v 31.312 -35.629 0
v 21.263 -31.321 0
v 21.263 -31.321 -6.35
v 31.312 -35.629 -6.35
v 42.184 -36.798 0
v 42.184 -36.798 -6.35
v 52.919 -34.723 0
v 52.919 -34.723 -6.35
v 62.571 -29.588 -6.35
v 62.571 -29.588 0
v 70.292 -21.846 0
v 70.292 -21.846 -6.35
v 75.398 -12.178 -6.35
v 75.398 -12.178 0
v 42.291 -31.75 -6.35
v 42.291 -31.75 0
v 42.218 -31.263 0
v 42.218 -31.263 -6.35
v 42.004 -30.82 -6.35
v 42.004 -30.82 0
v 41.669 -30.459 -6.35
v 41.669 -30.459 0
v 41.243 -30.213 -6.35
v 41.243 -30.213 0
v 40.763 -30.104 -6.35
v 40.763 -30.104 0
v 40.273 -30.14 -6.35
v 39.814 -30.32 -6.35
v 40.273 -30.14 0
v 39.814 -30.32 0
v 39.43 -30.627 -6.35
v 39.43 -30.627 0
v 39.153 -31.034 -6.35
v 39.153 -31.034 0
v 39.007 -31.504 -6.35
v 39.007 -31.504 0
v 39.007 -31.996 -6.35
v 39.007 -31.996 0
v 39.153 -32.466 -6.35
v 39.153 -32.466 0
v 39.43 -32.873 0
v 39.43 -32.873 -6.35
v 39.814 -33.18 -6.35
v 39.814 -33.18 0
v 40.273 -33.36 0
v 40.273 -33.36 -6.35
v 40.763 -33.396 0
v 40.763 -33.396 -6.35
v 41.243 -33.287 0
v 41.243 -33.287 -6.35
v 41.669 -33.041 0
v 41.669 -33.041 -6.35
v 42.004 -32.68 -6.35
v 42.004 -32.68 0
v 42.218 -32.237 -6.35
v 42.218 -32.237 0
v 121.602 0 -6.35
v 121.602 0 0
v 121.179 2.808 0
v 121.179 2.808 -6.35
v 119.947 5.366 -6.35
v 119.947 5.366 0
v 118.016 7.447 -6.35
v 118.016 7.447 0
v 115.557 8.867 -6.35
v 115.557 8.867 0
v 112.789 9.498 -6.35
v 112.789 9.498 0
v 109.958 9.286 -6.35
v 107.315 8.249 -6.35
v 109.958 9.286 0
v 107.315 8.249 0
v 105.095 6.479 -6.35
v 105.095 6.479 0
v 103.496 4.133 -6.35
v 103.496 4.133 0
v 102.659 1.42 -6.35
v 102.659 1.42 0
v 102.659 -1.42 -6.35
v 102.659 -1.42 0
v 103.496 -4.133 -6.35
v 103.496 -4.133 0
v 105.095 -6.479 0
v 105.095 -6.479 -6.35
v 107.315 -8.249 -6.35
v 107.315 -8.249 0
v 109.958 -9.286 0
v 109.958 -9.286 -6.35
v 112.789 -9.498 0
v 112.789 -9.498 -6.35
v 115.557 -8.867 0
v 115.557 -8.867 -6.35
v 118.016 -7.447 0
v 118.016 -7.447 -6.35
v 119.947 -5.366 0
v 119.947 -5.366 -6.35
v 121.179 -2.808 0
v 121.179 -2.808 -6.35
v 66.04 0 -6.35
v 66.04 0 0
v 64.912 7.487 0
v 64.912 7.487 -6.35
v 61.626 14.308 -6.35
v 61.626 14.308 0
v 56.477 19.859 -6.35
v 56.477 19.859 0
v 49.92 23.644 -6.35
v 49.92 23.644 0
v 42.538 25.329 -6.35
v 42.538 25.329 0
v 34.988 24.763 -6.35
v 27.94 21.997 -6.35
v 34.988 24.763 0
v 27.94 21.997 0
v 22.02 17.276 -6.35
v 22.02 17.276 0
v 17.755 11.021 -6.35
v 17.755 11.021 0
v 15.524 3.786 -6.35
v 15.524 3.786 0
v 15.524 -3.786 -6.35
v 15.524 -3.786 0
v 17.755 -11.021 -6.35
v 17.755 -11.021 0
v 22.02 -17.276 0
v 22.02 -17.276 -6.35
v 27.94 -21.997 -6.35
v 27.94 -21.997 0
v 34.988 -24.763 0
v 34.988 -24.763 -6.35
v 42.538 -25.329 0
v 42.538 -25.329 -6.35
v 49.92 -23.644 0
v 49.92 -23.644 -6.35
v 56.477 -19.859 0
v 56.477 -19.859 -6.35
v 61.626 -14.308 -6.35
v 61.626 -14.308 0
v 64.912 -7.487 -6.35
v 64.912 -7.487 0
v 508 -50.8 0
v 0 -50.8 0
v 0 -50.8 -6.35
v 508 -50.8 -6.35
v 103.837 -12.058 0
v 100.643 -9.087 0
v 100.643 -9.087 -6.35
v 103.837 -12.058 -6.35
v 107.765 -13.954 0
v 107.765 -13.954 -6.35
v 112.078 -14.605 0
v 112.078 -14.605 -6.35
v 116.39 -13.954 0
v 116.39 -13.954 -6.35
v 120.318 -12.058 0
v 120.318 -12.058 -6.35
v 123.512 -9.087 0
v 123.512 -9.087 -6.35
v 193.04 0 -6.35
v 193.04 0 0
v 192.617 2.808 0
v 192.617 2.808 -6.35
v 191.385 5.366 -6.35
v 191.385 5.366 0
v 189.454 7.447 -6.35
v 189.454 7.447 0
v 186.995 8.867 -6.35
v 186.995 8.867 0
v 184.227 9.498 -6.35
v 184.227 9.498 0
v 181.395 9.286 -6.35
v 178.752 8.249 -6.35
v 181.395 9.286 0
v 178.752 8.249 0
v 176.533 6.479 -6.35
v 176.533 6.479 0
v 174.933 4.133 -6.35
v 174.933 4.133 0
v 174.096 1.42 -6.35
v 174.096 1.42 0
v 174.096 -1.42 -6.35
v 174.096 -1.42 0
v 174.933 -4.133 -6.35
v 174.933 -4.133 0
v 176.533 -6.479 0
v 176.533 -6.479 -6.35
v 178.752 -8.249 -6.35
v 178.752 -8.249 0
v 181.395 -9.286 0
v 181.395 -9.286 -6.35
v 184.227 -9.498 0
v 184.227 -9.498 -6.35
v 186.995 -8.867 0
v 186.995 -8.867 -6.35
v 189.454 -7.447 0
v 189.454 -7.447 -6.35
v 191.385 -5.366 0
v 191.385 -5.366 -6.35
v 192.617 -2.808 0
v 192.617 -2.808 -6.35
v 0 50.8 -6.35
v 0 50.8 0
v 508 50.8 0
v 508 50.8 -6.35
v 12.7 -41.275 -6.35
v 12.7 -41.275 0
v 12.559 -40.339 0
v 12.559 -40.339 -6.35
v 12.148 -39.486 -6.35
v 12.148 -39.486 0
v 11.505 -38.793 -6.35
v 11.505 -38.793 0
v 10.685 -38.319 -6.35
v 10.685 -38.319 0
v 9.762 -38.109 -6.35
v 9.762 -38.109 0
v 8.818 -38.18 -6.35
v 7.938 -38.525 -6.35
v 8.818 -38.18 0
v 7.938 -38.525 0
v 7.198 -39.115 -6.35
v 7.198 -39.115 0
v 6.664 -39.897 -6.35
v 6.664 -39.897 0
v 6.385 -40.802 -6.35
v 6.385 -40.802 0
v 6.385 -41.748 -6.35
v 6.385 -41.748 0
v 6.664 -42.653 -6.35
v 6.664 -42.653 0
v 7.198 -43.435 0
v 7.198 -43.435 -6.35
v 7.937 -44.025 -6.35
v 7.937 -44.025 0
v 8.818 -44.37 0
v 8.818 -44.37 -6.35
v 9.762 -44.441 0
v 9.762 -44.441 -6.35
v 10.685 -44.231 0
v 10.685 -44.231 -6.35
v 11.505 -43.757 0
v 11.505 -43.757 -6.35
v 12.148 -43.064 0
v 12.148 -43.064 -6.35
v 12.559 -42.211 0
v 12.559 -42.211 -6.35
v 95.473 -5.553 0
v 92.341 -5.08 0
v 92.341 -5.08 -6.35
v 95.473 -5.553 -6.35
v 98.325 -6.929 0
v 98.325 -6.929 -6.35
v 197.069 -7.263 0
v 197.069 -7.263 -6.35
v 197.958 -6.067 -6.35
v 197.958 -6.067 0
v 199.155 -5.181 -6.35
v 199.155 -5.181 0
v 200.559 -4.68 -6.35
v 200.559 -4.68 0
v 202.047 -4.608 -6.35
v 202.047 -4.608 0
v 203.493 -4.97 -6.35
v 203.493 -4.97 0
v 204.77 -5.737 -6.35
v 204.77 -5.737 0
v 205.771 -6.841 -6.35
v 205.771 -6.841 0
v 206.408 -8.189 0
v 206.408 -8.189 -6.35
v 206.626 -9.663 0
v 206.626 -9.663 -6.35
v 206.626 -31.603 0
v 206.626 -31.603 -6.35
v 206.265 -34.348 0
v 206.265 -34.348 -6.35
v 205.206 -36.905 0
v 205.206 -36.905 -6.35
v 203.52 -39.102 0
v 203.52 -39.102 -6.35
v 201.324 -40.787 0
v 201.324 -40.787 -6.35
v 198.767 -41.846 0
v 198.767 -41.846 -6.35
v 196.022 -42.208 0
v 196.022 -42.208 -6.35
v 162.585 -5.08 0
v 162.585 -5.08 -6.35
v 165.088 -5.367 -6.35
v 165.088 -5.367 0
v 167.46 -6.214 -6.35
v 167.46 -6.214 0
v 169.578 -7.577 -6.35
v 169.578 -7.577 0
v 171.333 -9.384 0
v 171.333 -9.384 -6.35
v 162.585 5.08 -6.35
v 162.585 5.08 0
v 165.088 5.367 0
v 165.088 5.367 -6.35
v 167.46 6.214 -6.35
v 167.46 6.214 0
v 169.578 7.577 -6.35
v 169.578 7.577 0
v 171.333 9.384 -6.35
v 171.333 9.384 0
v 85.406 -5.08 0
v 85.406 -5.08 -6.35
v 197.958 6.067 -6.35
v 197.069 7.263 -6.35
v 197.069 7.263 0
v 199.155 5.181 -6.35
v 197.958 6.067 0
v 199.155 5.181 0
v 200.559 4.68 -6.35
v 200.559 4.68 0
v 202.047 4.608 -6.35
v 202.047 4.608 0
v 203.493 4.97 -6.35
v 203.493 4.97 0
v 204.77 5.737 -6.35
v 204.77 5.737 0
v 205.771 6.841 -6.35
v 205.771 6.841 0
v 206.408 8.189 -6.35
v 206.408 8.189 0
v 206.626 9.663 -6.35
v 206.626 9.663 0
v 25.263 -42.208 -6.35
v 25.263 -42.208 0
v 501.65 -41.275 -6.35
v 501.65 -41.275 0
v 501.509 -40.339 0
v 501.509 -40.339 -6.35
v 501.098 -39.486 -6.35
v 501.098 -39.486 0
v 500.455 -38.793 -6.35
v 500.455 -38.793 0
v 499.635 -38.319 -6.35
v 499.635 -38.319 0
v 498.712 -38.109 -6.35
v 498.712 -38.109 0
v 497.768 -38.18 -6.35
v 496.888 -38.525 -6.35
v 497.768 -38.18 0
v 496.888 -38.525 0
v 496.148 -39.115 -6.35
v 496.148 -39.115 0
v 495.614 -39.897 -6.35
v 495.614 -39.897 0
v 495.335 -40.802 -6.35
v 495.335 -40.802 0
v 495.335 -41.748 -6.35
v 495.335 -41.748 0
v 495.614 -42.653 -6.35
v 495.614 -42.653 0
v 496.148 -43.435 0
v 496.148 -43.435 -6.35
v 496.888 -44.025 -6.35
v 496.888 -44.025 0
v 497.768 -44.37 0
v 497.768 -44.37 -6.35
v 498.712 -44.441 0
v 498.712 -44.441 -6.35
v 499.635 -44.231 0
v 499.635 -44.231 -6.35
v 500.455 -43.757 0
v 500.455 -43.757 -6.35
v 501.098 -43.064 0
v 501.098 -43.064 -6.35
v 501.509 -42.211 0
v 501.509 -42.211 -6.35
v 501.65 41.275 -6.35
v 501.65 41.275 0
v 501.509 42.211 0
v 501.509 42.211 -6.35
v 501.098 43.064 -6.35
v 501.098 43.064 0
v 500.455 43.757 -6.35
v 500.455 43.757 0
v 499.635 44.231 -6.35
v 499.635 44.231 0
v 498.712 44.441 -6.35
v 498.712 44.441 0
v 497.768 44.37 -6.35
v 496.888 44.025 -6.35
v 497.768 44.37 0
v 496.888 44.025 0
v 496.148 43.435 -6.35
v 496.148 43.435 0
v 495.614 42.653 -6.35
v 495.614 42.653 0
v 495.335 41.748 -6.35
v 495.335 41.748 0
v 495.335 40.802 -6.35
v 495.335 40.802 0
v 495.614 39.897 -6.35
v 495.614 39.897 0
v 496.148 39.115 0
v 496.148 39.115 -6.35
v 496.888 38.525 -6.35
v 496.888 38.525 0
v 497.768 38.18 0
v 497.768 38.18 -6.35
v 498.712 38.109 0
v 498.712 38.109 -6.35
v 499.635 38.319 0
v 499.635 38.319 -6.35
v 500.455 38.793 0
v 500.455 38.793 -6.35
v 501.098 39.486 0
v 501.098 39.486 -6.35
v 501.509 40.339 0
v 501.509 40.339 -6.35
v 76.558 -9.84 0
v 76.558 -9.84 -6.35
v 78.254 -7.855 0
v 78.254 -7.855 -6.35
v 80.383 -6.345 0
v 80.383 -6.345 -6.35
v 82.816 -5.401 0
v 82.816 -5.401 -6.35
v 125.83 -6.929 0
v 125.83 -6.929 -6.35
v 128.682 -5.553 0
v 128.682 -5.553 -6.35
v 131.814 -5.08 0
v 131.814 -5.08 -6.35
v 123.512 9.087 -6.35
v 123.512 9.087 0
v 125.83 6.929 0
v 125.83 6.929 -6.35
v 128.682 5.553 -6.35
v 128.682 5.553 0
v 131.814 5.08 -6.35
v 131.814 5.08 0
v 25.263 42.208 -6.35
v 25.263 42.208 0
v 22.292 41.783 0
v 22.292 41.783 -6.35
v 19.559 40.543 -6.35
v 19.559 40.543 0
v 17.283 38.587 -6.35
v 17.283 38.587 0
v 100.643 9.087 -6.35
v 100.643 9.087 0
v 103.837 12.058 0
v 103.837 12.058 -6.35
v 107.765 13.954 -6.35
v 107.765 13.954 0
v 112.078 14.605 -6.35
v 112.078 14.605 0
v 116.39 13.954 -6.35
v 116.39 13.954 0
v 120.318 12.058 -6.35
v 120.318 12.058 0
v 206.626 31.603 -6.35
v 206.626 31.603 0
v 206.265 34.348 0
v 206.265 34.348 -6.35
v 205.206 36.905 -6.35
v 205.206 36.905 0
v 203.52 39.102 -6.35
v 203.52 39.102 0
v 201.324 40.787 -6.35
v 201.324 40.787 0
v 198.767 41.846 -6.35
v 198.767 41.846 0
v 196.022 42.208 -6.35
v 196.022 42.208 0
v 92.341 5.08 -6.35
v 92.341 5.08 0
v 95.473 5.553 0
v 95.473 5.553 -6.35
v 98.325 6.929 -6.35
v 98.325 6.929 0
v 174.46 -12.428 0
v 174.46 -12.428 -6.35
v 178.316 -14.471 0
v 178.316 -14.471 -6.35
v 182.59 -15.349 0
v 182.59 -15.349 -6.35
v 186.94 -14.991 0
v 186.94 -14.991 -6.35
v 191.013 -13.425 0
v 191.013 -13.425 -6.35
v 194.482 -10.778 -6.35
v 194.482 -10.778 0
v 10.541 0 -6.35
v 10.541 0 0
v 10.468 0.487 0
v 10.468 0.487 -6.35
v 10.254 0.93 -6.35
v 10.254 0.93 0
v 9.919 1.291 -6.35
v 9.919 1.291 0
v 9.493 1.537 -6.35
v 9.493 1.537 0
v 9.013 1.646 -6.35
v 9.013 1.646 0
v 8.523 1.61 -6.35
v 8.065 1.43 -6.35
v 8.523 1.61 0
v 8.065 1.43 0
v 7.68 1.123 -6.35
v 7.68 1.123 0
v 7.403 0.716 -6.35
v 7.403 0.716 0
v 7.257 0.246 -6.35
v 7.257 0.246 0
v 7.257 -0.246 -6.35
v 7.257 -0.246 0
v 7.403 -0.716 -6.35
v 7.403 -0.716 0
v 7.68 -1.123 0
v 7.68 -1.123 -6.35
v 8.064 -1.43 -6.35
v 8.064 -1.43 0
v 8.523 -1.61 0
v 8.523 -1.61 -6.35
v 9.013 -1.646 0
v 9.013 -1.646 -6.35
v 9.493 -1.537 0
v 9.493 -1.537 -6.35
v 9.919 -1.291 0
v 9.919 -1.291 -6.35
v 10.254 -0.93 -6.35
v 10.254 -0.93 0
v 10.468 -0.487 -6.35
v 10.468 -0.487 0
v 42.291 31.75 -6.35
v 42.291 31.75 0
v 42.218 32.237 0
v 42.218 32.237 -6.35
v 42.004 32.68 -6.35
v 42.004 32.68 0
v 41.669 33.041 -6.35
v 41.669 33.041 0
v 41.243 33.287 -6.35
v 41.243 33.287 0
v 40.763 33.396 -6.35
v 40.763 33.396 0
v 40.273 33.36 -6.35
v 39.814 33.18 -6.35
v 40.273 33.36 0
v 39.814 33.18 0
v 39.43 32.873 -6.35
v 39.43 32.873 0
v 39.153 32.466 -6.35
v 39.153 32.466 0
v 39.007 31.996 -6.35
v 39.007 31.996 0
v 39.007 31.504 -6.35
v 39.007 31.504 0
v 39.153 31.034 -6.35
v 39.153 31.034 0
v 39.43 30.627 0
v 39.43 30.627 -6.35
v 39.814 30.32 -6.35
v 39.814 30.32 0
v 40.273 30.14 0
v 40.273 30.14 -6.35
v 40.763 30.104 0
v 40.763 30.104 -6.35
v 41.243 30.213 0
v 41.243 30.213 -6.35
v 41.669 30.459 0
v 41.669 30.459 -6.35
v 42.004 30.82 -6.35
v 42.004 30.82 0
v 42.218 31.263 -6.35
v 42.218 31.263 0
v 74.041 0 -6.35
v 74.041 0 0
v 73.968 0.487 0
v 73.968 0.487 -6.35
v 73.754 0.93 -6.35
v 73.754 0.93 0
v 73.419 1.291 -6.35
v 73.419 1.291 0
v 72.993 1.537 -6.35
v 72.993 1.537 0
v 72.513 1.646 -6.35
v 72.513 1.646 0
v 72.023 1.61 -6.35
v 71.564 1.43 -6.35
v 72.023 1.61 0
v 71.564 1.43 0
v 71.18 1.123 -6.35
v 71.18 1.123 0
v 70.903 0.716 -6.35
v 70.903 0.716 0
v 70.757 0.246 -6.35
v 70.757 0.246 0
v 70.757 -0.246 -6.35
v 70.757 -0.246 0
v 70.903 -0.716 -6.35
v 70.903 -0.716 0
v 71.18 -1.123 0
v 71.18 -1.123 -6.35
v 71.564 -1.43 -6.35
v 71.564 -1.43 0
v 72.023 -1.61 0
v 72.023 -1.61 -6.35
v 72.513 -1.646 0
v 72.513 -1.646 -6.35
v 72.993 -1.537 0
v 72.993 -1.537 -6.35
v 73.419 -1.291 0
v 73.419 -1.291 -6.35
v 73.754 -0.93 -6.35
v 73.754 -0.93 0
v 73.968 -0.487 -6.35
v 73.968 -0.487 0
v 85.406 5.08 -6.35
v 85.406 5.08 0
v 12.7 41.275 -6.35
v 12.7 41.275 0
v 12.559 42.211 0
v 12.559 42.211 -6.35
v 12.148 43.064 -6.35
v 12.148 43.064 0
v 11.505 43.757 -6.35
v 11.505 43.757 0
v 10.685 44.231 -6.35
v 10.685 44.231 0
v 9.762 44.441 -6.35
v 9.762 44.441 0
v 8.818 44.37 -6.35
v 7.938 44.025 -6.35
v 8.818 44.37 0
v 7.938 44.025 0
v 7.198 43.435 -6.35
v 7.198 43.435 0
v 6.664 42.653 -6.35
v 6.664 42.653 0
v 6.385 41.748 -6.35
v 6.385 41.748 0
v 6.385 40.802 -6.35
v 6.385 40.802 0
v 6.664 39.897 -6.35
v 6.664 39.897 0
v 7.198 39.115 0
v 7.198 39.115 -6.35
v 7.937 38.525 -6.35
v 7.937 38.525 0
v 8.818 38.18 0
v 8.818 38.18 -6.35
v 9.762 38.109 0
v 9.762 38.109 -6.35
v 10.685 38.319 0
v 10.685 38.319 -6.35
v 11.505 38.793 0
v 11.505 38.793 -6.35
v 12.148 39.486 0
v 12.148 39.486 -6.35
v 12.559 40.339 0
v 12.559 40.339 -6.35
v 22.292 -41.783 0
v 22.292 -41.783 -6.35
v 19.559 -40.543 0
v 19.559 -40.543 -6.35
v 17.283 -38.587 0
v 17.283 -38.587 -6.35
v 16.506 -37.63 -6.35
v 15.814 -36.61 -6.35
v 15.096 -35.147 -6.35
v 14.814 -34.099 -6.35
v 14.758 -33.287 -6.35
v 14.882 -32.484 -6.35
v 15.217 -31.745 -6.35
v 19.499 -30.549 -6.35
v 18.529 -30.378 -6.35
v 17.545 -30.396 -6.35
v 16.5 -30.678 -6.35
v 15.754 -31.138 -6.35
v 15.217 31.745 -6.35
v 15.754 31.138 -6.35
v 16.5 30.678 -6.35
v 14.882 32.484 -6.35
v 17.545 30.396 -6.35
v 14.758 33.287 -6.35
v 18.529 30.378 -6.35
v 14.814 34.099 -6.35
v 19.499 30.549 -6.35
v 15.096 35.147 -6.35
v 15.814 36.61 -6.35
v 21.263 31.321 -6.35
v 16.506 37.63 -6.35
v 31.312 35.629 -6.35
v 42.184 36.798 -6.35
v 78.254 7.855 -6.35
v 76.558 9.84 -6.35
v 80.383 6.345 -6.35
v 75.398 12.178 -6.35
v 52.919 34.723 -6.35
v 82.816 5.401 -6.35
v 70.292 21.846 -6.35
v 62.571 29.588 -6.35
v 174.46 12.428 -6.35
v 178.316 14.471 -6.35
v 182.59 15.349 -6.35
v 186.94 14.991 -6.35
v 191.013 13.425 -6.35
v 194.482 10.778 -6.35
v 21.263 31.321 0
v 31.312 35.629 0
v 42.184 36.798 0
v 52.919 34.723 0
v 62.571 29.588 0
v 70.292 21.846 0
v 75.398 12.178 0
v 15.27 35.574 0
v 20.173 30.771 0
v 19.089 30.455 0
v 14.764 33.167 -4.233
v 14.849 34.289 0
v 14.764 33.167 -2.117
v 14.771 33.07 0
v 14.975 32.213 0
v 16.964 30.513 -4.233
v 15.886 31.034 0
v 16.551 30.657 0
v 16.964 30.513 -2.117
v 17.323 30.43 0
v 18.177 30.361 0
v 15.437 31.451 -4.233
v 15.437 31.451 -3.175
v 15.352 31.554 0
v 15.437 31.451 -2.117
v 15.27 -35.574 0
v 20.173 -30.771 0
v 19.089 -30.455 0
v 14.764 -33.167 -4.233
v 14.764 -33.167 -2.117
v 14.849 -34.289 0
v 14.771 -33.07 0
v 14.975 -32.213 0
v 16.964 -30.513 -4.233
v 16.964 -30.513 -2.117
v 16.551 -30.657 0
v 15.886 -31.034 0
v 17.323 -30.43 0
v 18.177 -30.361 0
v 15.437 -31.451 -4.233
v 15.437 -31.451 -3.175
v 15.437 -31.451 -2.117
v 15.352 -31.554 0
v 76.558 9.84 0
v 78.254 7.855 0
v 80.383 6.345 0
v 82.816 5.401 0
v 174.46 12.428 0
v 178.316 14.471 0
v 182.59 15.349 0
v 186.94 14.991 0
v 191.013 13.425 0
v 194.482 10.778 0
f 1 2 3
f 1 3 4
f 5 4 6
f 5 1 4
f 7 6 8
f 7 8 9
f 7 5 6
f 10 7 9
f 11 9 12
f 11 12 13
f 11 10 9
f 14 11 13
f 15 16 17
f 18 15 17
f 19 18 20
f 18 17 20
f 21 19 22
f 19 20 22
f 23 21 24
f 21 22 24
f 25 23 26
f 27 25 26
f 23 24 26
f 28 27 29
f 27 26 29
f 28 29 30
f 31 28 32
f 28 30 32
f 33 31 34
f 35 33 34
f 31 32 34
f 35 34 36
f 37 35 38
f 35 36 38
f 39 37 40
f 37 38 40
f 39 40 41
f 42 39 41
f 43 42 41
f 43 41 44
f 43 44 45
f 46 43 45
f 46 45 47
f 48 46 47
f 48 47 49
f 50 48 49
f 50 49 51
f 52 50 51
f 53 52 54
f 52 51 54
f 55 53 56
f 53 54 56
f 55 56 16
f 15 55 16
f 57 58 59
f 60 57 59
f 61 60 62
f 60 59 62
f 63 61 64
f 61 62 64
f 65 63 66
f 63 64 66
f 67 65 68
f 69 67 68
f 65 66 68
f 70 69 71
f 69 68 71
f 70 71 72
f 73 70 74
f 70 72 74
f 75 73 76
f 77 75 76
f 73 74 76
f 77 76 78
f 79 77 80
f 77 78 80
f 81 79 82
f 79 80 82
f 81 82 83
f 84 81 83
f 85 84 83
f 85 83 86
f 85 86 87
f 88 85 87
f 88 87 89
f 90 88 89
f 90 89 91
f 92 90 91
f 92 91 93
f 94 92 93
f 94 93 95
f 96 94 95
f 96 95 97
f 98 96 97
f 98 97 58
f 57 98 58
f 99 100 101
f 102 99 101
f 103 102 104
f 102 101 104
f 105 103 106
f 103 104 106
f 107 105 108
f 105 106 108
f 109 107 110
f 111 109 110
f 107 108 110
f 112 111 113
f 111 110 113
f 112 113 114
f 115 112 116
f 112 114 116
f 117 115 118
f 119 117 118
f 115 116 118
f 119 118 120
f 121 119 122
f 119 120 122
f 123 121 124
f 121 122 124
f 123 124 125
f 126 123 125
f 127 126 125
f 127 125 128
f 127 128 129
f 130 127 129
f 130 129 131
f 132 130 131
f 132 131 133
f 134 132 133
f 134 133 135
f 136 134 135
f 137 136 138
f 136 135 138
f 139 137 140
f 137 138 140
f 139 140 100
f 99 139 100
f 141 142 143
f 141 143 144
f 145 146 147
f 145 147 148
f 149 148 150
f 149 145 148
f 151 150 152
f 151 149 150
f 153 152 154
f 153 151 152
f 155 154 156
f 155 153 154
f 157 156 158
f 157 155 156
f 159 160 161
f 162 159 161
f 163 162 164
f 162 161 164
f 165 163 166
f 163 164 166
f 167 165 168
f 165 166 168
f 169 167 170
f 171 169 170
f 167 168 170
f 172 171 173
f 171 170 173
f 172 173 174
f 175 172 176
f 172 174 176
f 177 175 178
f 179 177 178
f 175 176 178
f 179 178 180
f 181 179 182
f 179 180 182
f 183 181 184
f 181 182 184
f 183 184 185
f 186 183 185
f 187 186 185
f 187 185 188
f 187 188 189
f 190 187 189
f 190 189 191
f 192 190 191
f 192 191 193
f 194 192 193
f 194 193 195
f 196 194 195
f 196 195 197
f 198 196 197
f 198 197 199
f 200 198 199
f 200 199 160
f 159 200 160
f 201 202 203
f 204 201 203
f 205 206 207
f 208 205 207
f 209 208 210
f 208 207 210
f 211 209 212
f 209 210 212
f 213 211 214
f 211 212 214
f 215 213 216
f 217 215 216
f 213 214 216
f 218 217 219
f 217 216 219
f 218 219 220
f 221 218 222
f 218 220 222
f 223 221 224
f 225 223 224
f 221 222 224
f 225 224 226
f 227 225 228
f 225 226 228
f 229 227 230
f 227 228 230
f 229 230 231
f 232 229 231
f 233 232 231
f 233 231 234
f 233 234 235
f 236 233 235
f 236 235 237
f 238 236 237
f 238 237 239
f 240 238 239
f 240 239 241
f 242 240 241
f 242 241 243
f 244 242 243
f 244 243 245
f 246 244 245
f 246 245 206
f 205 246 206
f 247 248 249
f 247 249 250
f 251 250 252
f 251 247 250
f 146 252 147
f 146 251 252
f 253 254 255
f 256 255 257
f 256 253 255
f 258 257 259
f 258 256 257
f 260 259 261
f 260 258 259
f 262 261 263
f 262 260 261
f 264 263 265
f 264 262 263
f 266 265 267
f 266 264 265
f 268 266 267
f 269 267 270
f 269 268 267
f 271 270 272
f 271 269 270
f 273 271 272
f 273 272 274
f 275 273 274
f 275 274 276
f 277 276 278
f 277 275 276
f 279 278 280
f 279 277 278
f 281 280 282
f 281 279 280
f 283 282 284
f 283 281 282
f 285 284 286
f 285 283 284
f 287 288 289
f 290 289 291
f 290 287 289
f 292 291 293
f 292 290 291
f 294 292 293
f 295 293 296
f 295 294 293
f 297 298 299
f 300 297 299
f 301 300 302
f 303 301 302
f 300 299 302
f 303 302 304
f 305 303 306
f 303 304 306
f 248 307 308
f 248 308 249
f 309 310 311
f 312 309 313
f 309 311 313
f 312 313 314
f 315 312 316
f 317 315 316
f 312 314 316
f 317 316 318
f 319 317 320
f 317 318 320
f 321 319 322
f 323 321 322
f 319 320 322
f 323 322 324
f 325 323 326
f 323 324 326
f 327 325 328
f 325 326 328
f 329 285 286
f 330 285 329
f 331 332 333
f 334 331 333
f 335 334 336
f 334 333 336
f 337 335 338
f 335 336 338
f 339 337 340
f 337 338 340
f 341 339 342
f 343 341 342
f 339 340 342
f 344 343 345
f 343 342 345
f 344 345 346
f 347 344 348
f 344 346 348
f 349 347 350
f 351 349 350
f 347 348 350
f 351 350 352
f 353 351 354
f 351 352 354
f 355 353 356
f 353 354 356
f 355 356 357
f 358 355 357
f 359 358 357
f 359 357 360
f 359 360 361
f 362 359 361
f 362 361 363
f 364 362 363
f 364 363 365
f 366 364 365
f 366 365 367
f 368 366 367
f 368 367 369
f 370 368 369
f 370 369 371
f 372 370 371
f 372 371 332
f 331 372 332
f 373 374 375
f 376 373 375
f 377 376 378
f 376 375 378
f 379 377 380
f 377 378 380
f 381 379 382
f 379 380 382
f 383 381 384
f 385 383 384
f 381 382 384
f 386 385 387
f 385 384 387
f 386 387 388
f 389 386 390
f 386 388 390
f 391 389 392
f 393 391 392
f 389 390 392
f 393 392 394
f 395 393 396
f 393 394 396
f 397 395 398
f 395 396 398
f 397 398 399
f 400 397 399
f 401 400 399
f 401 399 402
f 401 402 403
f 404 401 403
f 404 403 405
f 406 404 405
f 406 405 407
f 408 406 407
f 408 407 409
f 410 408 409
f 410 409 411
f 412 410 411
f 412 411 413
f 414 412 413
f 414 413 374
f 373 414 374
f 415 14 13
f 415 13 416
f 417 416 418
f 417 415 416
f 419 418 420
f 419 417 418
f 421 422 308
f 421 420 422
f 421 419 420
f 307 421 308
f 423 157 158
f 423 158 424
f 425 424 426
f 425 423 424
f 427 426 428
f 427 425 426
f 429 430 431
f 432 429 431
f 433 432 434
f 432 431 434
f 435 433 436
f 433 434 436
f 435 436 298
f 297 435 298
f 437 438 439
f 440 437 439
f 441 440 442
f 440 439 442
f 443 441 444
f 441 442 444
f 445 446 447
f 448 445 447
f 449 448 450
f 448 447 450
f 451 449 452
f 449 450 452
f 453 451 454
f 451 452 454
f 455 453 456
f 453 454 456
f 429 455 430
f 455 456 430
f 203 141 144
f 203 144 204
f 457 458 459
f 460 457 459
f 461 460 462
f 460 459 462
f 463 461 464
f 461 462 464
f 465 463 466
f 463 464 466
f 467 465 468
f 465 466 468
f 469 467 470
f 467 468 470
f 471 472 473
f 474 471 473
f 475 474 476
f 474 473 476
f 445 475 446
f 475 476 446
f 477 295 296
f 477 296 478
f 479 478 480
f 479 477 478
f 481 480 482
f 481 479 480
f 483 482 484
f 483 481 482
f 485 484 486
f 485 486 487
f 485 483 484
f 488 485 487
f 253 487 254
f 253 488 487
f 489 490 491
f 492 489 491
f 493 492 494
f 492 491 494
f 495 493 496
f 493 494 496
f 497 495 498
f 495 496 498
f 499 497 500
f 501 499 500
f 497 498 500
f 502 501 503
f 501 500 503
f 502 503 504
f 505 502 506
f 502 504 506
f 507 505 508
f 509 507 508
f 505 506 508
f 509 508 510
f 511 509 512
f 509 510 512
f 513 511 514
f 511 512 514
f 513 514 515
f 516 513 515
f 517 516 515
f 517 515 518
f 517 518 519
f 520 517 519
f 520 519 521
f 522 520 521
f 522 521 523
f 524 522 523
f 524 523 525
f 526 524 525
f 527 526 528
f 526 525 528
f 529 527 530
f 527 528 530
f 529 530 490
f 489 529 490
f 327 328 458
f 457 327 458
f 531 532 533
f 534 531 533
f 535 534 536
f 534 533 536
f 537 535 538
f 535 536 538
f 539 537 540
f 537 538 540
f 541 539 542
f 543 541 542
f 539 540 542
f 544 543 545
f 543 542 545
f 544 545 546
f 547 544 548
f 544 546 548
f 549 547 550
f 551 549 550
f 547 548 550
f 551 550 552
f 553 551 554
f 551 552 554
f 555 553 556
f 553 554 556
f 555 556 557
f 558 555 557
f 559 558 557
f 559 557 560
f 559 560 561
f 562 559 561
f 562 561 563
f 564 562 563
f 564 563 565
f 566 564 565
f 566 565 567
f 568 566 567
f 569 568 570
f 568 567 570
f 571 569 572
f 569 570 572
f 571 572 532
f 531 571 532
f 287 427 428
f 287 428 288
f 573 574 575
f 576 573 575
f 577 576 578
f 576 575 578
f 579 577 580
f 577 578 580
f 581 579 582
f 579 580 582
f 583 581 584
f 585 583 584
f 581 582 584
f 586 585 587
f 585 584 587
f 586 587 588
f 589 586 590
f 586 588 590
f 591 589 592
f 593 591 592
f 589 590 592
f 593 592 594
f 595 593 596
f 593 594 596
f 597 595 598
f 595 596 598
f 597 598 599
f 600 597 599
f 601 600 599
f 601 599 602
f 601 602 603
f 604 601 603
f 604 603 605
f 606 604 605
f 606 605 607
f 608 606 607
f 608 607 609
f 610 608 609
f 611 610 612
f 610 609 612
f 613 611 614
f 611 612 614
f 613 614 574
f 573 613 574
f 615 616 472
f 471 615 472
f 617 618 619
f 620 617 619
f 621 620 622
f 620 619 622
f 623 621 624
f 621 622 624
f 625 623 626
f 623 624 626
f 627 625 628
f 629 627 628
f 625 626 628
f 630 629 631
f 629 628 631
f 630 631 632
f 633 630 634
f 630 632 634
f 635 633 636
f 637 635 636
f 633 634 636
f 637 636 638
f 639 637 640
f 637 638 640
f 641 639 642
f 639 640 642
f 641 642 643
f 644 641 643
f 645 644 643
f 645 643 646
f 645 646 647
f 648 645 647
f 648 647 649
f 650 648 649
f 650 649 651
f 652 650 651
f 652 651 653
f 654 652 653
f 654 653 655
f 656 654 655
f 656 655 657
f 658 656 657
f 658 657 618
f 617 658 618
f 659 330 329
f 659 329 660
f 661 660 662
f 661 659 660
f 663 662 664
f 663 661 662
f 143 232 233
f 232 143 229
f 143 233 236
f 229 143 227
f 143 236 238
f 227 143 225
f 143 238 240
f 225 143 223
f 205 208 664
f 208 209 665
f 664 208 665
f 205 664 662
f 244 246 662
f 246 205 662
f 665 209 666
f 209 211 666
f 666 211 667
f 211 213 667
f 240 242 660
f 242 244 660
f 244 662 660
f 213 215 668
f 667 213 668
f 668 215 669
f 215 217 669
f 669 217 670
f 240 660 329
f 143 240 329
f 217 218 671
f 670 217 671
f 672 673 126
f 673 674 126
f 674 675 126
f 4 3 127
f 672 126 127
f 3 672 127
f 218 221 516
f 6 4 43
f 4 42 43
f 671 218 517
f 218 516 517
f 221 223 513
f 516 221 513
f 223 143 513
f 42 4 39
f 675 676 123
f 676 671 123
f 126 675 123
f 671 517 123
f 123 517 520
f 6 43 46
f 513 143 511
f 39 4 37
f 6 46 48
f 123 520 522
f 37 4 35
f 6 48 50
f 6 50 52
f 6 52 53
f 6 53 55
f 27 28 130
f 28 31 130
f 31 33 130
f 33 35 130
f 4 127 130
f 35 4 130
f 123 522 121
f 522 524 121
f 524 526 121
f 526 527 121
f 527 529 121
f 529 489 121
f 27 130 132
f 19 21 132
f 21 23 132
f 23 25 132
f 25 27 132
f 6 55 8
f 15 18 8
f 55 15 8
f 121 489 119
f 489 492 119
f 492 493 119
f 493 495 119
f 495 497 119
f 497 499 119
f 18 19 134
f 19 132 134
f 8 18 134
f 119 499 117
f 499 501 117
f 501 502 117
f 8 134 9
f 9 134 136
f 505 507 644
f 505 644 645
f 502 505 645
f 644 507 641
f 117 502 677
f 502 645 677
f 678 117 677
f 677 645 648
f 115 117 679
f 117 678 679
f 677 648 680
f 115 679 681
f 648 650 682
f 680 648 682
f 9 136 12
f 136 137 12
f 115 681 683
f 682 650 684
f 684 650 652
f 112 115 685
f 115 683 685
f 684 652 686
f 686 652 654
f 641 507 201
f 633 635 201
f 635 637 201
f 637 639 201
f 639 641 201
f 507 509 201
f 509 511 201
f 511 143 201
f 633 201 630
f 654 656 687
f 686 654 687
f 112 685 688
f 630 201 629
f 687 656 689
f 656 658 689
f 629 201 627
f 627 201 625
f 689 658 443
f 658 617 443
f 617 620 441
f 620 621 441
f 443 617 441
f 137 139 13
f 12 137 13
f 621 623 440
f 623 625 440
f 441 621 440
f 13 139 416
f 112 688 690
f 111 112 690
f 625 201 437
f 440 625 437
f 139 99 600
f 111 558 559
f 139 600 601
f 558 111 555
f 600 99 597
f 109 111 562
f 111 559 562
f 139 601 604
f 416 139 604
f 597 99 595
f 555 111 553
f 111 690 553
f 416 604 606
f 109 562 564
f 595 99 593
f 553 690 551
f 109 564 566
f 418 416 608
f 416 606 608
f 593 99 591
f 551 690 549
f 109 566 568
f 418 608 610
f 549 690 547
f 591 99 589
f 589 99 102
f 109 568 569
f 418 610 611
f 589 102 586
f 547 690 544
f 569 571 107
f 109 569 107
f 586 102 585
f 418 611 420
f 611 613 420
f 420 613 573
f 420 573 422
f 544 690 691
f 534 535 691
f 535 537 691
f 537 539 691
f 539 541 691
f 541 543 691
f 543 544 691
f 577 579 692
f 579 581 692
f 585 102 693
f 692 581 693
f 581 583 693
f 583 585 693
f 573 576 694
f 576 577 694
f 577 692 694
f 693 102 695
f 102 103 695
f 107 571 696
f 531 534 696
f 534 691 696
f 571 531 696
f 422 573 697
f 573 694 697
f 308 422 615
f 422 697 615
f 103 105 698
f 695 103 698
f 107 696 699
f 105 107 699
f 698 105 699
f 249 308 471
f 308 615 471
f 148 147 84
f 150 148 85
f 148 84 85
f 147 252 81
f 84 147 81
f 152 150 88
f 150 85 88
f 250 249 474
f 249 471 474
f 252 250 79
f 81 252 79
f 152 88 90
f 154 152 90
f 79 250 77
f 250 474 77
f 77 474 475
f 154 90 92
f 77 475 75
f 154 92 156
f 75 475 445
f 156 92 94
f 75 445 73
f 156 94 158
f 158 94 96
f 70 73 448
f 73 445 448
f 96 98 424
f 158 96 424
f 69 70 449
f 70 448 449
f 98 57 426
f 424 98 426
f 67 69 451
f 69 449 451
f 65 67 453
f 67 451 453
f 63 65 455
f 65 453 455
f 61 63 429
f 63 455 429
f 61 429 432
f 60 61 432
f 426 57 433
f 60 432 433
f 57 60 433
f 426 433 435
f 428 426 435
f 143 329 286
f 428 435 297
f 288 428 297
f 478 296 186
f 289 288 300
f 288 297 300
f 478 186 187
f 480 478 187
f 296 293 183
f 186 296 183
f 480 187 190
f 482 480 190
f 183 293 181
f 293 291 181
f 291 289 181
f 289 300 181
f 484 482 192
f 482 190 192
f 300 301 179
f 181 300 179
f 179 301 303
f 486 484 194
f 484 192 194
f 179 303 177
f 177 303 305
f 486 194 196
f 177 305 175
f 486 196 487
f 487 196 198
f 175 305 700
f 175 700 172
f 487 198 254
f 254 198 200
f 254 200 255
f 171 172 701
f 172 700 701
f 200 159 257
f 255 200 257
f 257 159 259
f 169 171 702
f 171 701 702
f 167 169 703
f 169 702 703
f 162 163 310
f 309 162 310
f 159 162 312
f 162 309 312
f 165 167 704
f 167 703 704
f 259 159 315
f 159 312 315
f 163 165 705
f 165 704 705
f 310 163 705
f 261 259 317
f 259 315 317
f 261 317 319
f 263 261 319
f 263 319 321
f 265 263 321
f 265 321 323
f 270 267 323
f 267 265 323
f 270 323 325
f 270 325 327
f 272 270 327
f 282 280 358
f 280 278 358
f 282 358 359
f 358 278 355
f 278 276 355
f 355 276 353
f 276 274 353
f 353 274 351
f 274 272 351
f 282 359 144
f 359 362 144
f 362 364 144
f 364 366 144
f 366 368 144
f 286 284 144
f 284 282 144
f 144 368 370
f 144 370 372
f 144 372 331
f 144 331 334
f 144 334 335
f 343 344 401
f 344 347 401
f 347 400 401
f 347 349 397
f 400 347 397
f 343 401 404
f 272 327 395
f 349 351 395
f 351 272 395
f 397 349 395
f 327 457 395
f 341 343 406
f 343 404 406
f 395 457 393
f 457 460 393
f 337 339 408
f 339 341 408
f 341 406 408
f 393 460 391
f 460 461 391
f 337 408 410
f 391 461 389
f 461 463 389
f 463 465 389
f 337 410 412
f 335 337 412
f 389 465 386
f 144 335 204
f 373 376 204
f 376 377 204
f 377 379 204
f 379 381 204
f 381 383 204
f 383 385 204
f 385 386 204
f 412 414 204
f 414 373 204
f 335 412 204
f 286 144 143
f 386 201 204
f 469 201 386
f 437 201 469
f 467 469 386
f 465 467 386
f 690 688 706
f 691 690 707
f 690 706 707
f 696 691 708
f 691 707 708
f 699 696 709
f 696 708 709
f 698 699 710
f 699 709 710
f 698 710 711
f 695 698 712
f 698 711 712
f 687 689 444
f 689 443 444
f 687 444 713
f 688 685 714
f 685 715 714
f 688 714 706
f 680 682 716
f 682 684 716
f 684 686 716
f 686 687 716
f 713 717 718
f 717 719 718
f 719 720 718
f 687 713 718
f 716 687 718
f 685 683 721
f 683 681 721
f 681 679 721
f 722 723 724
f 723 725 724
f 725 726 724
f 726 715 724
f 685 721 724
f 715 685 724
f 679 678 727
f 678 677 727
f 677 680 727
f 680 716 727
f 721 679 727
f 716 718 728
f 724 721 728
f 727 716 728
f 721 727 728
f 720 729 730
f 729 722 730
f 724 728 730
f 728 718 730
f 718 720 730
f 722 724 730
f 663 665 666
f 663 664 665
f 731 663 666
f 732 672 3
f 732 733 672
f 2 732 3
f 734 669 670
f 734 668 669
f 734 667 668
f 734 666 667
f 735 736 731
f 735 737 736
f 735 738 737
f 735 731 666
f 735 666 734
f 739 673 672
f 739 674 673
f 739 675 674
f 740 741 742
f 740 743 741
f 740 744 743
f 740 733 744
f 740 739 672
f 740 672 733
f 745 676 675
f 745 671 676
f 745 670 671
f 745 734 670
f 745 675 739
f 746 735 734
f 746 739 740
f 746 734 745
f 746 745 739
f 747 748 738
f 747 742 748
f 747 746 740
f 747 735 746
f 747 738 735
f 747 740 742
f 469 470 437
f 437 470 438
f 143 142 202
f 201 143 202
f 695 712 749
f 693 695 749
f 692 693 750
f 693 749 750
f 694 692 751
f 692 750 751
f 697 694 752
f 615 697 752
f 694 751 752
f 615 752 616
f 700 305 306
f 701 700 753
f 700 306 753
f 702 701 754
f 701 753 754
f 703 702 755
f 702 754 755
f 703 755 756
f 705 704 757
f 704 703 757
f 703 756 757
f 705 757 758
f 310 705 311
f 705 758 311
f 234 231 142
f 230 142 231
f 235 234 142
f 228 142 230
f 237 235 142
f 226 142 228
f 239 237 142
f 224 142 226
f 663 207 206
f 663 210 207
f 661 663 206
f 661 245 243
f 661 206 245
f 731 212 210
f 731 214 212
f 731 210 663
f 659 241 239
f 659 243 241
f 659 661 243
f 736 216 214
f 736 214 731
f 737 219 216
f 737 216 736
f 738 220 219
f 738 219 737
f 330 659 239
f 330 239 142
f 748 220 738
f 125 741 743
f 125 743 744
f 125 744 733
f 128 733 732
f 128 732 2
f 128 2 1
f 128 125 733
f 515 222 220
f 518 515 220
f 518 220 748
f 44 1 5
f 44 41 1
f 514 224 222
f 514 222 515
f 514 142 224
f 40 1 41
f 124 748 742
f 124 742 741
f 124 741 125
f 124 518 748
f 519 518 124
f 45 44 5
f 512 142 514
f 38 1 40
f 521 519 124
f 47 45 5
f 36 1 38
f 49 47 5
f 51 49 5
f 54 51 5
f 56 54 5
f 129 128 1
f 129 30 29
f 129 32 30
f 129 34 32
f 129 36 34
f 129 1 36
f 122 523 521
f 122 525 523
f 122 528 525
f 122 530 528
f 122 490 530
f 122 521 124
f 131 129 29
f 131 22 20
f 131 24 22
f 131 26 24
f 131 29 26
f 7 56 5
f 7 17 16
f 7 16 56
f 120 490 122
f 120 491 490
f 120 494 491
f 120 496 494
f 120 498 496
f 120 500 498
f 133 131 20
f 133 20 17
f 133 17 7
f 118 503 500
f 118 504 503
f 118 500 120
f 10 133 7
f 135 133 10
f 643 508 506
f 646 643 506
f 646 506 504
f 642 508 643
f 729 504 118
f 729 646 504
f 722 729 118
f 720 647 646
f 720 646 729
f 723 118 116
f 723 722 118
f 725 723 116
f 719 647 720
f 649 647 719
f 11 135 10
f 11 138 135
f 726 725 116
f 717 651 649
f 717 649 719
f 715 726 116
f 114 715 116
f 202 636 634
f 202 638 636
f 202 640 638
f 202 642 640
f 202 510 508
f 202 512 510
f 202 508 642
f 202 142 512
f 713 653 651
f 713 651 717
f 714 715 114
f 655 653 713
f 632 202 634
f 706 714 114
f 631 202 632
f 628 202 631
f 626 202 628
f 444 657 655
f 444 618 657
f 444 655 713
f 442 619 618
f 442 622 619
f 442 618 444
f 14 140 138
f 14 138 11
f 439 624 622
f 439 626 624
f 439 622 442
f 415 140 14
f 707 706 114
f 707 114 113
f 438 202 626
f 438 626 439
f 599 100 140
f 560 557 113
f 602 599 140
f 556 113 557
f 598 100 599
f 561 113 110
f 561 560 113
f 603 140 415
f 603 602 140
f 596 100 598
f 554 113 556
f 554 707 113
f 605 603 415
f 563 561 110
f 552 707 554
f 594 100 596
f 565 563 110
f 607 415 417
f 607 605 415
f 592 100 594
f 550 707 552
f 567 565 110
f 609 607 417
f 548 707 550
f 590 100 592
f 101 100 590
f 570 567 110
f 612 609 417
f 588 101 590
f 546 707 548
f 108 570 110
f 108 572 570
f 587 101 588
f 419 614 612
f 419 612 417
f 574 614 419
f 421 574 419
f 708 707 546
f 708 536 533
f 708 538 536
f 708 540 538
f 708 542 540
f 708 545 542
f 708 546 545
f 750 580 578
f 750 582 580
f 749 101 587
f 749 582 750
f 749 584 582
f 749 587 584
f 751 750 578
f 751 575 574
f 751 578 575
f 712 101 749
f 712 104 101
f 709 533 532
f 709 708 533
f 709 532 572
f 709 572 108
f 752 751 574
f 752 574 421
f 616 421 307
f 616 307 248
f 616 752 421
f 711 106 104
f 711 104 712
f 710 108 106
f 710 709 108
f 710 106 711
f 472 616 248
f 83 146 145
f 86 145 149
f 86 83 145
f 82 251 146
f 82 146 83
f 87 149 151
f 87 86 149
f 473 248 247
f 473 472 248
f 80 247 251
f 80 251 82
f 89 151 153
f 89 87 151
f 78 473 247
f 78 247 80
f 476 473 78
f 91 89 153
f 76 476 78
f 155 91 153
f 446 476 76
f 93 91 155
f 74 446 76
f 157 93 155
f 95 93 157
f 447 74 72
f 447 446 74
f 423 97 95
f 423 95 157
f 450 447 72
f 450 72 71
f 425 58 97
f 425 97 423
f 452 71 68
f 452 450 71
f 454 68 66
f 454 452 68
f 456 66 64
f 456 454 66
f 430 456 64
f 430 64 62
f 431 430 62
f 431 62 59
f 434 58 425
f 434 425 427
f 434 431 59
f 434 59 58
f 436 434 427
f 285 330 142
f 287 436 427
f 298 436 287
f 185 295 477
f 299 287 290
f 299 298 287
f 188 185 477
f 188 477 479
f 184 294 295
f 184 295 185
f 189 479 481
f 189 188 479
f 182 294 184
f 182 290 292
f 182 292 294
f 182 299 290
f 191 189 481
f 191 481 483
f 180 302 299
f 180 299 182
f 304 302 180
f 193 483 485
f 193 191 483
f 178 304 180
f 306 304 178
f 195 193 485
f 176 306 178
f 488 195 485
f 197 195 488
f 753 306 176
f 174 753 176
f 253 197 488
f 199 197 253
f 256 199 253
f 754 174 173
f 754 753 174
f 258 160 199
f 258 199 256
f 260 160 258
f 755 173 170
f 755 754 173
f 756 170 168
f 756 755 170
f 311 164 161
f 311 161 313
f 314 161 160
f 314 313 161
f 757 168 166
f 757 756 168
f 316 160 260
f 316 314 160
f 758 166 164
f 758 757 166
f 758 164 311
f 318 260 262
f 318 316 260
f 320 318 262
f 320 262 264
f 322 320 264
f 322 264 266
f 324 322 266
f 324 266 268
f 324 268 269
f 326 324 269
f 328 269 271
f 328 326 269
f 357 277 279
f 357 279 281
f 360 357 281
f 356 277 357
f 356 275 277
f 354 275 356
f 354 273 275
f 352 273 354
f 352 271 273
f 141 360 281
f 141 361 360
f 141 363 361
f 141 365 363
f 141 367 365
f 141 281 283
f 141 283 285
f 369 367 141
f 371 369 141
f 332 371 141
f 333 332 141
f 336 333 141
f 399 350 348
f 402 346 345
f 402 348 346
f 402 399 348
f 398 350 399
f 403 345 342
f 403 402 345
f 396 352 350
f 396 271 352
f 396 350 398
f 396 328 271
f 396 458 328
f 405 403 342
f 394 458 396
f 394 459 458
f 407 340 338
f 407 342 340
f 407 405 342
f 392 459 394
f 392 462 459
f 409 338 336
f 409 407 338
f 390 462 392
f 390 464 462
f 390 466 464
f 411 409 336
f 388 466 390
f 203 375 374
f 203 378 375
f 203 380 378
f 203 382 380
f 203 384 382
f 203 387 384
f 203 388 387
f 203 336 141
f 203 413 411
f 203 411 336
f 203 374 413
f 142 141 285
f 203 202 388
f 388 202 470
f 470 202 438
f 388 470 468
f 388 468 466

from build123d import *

# Parameters (mm, degrees)
SKETCH1_W           = 508
SKETCH1_H           = 101.6
BOSS_EXTRUDE1_DEPTH = 6.35
SKETCH2_R           = 25.4
SKETCH2_R_2         = 1.651
MOTOR_MOUNT_DEPTH   = 6.35
SKETCH3_R           = 9.525
CUT_EXTRUDE2_DEPTH  = 511.573170564
SKETCH4_R           = 3.175
CUT_EXTRUDE3_DEPTH  = 511.573170564
CUT_EXTRUDE4_DEPTH  = 511.573170564


with BuildPart() as part:
    # Sketch1 → Boss-Extrude1 (new body)
    with BuildSketch(Plane.XY):
        with Locations((254, 0)):
            Rectangle(SKETCH1_W, SKETCH1_H)
    extrude(amount=-BOSS_EXTRUDE1_DEPTH)

    # Sketch2 → Motor mount (cut)
    with BuildSketch(Plane.XY):
        with Locations((40.64, 0)):
            Circle(SKETCH2_R)
        with Locations((72.39, 0)):
            Circle(SKETCH2_R_2)
        with Locations((40.64, -31.75)):
            Circle(SKETCH2_R_2)
        with Locations((8.89, 0)):
            Circle(SKETCH2_R_2)
        with Locations((40.64, 31.75)):
            Circle(SKETCH2_R_2)
    extrude(amount=-MOTOR_MOUNT_DEPTH, mode=Mode.SUBTRACT)

    # Sketch3 → Cut-Extrude2 (cut, through all)
    with BuildSketch(Plane.XY):
        with Locations((112.0775, 0)):
            Circle(SKETCH3_R)
        with Locations((183.515, 0)):
            Circle(SKETCH3_R)
    extrude(amount=-CUT_EXTRUDE2_DEPTH, mode=Mode.SUBTRACT)

    # Sketch4 → Cut-Extrude3 (cut, through all)
    with BuildSketch(Plane.XY):
        with Locations((9.525, 41.275)):
            Circle(SKETCH4_R)
        with Locations((9.525, -41.275)):
            Circle(SKETCH4_R)
        with Locations((498.475, 41.275)):
            Circle(SKETCH4_R)
        with Locations((498.475, -41.275)):
            Circle(SKETCH4_R)
    extrude(amount=-CUT_EXTRUDE3_DEPTH, mode=Mode.SUBTRACT)

    # Sketch7 → Cut-Extrude4 (cut, through all)
    with BuildSketch(Plane.XY):
        with BuildLine():
            Line((85.406292789, 5.08), (92.341412089, 5.08))
            ThreePointArc((92.341412089, 5.08), (96.950572969, 6.134064693), (100.643442411, 9.08671294))
            ThreePointArc((100.643442411, 9.08671294), (112.0775, 14.605), (123.511557589, 9.08671294))
            ThreePointArc((123.511557589, 9.08671294), (127.204427031, 6.134064693), (131.813587911, 5.08))
            Line((131.813587911, 5.08), (162.585112959, 5.08))
            ThreePointArc((162.585112959, 5.08), (167.45975122, 6.214203951), (171.333000793, 9.383818205))
            ThreePointArc((171.333000793, 9.383818205), (184.777760897, 15.325227036), (197.068677539, 7.263261936))
            ThreePointArc((197.068677539, 7.263261936), (202.783248212, 4.735656121), (206.626270766, 9.662753319))
            Line((206.626270766, 9.662753319), (206.626270766, 31.603209647))
            ThreePointArc((206.626270766, 31.603209647), (203.520318205, 39.101642443), (196.02188541, 42.207595003))
            Line((196.02188541, 42.207595003), (25.263102588, 42.207595003))
            ThreePointArc((25.263102588, 42.207595003), (20.881723867, 41.260150637), (17.283250038, 38.587115578))
            add(Edge.make_bspline(
                [(17.283250038, 38.587115578), (11.530533455, 32.014027317), (16.787146308, 28.551640426), (21.263438452, 31.320883809)],
                knots=[0, 0, 0, 0, 1, 1, 1, 1], degree=3))
            ThreePointArc((21.263438452, 31.320883809), (52.918543043, 34.722993545), (75.39838363, 12.177999321))
            ThreePointArc((75.39838363, 12.177999321), (79.271558889, 7.034643814), (85.406292789, 5.08))
        make_face()
    cut_extrude4 = extrude(amount=-CUT_EXTRUDE4_DEPTH, mode=Mode.SUBTRACT)

    # Mirror1: Cut-Extrude4 across plane
    add(cut_extrude4.mirror(Plane.ZX), mode=Mode.SUBTRACT)


solid = part.part
